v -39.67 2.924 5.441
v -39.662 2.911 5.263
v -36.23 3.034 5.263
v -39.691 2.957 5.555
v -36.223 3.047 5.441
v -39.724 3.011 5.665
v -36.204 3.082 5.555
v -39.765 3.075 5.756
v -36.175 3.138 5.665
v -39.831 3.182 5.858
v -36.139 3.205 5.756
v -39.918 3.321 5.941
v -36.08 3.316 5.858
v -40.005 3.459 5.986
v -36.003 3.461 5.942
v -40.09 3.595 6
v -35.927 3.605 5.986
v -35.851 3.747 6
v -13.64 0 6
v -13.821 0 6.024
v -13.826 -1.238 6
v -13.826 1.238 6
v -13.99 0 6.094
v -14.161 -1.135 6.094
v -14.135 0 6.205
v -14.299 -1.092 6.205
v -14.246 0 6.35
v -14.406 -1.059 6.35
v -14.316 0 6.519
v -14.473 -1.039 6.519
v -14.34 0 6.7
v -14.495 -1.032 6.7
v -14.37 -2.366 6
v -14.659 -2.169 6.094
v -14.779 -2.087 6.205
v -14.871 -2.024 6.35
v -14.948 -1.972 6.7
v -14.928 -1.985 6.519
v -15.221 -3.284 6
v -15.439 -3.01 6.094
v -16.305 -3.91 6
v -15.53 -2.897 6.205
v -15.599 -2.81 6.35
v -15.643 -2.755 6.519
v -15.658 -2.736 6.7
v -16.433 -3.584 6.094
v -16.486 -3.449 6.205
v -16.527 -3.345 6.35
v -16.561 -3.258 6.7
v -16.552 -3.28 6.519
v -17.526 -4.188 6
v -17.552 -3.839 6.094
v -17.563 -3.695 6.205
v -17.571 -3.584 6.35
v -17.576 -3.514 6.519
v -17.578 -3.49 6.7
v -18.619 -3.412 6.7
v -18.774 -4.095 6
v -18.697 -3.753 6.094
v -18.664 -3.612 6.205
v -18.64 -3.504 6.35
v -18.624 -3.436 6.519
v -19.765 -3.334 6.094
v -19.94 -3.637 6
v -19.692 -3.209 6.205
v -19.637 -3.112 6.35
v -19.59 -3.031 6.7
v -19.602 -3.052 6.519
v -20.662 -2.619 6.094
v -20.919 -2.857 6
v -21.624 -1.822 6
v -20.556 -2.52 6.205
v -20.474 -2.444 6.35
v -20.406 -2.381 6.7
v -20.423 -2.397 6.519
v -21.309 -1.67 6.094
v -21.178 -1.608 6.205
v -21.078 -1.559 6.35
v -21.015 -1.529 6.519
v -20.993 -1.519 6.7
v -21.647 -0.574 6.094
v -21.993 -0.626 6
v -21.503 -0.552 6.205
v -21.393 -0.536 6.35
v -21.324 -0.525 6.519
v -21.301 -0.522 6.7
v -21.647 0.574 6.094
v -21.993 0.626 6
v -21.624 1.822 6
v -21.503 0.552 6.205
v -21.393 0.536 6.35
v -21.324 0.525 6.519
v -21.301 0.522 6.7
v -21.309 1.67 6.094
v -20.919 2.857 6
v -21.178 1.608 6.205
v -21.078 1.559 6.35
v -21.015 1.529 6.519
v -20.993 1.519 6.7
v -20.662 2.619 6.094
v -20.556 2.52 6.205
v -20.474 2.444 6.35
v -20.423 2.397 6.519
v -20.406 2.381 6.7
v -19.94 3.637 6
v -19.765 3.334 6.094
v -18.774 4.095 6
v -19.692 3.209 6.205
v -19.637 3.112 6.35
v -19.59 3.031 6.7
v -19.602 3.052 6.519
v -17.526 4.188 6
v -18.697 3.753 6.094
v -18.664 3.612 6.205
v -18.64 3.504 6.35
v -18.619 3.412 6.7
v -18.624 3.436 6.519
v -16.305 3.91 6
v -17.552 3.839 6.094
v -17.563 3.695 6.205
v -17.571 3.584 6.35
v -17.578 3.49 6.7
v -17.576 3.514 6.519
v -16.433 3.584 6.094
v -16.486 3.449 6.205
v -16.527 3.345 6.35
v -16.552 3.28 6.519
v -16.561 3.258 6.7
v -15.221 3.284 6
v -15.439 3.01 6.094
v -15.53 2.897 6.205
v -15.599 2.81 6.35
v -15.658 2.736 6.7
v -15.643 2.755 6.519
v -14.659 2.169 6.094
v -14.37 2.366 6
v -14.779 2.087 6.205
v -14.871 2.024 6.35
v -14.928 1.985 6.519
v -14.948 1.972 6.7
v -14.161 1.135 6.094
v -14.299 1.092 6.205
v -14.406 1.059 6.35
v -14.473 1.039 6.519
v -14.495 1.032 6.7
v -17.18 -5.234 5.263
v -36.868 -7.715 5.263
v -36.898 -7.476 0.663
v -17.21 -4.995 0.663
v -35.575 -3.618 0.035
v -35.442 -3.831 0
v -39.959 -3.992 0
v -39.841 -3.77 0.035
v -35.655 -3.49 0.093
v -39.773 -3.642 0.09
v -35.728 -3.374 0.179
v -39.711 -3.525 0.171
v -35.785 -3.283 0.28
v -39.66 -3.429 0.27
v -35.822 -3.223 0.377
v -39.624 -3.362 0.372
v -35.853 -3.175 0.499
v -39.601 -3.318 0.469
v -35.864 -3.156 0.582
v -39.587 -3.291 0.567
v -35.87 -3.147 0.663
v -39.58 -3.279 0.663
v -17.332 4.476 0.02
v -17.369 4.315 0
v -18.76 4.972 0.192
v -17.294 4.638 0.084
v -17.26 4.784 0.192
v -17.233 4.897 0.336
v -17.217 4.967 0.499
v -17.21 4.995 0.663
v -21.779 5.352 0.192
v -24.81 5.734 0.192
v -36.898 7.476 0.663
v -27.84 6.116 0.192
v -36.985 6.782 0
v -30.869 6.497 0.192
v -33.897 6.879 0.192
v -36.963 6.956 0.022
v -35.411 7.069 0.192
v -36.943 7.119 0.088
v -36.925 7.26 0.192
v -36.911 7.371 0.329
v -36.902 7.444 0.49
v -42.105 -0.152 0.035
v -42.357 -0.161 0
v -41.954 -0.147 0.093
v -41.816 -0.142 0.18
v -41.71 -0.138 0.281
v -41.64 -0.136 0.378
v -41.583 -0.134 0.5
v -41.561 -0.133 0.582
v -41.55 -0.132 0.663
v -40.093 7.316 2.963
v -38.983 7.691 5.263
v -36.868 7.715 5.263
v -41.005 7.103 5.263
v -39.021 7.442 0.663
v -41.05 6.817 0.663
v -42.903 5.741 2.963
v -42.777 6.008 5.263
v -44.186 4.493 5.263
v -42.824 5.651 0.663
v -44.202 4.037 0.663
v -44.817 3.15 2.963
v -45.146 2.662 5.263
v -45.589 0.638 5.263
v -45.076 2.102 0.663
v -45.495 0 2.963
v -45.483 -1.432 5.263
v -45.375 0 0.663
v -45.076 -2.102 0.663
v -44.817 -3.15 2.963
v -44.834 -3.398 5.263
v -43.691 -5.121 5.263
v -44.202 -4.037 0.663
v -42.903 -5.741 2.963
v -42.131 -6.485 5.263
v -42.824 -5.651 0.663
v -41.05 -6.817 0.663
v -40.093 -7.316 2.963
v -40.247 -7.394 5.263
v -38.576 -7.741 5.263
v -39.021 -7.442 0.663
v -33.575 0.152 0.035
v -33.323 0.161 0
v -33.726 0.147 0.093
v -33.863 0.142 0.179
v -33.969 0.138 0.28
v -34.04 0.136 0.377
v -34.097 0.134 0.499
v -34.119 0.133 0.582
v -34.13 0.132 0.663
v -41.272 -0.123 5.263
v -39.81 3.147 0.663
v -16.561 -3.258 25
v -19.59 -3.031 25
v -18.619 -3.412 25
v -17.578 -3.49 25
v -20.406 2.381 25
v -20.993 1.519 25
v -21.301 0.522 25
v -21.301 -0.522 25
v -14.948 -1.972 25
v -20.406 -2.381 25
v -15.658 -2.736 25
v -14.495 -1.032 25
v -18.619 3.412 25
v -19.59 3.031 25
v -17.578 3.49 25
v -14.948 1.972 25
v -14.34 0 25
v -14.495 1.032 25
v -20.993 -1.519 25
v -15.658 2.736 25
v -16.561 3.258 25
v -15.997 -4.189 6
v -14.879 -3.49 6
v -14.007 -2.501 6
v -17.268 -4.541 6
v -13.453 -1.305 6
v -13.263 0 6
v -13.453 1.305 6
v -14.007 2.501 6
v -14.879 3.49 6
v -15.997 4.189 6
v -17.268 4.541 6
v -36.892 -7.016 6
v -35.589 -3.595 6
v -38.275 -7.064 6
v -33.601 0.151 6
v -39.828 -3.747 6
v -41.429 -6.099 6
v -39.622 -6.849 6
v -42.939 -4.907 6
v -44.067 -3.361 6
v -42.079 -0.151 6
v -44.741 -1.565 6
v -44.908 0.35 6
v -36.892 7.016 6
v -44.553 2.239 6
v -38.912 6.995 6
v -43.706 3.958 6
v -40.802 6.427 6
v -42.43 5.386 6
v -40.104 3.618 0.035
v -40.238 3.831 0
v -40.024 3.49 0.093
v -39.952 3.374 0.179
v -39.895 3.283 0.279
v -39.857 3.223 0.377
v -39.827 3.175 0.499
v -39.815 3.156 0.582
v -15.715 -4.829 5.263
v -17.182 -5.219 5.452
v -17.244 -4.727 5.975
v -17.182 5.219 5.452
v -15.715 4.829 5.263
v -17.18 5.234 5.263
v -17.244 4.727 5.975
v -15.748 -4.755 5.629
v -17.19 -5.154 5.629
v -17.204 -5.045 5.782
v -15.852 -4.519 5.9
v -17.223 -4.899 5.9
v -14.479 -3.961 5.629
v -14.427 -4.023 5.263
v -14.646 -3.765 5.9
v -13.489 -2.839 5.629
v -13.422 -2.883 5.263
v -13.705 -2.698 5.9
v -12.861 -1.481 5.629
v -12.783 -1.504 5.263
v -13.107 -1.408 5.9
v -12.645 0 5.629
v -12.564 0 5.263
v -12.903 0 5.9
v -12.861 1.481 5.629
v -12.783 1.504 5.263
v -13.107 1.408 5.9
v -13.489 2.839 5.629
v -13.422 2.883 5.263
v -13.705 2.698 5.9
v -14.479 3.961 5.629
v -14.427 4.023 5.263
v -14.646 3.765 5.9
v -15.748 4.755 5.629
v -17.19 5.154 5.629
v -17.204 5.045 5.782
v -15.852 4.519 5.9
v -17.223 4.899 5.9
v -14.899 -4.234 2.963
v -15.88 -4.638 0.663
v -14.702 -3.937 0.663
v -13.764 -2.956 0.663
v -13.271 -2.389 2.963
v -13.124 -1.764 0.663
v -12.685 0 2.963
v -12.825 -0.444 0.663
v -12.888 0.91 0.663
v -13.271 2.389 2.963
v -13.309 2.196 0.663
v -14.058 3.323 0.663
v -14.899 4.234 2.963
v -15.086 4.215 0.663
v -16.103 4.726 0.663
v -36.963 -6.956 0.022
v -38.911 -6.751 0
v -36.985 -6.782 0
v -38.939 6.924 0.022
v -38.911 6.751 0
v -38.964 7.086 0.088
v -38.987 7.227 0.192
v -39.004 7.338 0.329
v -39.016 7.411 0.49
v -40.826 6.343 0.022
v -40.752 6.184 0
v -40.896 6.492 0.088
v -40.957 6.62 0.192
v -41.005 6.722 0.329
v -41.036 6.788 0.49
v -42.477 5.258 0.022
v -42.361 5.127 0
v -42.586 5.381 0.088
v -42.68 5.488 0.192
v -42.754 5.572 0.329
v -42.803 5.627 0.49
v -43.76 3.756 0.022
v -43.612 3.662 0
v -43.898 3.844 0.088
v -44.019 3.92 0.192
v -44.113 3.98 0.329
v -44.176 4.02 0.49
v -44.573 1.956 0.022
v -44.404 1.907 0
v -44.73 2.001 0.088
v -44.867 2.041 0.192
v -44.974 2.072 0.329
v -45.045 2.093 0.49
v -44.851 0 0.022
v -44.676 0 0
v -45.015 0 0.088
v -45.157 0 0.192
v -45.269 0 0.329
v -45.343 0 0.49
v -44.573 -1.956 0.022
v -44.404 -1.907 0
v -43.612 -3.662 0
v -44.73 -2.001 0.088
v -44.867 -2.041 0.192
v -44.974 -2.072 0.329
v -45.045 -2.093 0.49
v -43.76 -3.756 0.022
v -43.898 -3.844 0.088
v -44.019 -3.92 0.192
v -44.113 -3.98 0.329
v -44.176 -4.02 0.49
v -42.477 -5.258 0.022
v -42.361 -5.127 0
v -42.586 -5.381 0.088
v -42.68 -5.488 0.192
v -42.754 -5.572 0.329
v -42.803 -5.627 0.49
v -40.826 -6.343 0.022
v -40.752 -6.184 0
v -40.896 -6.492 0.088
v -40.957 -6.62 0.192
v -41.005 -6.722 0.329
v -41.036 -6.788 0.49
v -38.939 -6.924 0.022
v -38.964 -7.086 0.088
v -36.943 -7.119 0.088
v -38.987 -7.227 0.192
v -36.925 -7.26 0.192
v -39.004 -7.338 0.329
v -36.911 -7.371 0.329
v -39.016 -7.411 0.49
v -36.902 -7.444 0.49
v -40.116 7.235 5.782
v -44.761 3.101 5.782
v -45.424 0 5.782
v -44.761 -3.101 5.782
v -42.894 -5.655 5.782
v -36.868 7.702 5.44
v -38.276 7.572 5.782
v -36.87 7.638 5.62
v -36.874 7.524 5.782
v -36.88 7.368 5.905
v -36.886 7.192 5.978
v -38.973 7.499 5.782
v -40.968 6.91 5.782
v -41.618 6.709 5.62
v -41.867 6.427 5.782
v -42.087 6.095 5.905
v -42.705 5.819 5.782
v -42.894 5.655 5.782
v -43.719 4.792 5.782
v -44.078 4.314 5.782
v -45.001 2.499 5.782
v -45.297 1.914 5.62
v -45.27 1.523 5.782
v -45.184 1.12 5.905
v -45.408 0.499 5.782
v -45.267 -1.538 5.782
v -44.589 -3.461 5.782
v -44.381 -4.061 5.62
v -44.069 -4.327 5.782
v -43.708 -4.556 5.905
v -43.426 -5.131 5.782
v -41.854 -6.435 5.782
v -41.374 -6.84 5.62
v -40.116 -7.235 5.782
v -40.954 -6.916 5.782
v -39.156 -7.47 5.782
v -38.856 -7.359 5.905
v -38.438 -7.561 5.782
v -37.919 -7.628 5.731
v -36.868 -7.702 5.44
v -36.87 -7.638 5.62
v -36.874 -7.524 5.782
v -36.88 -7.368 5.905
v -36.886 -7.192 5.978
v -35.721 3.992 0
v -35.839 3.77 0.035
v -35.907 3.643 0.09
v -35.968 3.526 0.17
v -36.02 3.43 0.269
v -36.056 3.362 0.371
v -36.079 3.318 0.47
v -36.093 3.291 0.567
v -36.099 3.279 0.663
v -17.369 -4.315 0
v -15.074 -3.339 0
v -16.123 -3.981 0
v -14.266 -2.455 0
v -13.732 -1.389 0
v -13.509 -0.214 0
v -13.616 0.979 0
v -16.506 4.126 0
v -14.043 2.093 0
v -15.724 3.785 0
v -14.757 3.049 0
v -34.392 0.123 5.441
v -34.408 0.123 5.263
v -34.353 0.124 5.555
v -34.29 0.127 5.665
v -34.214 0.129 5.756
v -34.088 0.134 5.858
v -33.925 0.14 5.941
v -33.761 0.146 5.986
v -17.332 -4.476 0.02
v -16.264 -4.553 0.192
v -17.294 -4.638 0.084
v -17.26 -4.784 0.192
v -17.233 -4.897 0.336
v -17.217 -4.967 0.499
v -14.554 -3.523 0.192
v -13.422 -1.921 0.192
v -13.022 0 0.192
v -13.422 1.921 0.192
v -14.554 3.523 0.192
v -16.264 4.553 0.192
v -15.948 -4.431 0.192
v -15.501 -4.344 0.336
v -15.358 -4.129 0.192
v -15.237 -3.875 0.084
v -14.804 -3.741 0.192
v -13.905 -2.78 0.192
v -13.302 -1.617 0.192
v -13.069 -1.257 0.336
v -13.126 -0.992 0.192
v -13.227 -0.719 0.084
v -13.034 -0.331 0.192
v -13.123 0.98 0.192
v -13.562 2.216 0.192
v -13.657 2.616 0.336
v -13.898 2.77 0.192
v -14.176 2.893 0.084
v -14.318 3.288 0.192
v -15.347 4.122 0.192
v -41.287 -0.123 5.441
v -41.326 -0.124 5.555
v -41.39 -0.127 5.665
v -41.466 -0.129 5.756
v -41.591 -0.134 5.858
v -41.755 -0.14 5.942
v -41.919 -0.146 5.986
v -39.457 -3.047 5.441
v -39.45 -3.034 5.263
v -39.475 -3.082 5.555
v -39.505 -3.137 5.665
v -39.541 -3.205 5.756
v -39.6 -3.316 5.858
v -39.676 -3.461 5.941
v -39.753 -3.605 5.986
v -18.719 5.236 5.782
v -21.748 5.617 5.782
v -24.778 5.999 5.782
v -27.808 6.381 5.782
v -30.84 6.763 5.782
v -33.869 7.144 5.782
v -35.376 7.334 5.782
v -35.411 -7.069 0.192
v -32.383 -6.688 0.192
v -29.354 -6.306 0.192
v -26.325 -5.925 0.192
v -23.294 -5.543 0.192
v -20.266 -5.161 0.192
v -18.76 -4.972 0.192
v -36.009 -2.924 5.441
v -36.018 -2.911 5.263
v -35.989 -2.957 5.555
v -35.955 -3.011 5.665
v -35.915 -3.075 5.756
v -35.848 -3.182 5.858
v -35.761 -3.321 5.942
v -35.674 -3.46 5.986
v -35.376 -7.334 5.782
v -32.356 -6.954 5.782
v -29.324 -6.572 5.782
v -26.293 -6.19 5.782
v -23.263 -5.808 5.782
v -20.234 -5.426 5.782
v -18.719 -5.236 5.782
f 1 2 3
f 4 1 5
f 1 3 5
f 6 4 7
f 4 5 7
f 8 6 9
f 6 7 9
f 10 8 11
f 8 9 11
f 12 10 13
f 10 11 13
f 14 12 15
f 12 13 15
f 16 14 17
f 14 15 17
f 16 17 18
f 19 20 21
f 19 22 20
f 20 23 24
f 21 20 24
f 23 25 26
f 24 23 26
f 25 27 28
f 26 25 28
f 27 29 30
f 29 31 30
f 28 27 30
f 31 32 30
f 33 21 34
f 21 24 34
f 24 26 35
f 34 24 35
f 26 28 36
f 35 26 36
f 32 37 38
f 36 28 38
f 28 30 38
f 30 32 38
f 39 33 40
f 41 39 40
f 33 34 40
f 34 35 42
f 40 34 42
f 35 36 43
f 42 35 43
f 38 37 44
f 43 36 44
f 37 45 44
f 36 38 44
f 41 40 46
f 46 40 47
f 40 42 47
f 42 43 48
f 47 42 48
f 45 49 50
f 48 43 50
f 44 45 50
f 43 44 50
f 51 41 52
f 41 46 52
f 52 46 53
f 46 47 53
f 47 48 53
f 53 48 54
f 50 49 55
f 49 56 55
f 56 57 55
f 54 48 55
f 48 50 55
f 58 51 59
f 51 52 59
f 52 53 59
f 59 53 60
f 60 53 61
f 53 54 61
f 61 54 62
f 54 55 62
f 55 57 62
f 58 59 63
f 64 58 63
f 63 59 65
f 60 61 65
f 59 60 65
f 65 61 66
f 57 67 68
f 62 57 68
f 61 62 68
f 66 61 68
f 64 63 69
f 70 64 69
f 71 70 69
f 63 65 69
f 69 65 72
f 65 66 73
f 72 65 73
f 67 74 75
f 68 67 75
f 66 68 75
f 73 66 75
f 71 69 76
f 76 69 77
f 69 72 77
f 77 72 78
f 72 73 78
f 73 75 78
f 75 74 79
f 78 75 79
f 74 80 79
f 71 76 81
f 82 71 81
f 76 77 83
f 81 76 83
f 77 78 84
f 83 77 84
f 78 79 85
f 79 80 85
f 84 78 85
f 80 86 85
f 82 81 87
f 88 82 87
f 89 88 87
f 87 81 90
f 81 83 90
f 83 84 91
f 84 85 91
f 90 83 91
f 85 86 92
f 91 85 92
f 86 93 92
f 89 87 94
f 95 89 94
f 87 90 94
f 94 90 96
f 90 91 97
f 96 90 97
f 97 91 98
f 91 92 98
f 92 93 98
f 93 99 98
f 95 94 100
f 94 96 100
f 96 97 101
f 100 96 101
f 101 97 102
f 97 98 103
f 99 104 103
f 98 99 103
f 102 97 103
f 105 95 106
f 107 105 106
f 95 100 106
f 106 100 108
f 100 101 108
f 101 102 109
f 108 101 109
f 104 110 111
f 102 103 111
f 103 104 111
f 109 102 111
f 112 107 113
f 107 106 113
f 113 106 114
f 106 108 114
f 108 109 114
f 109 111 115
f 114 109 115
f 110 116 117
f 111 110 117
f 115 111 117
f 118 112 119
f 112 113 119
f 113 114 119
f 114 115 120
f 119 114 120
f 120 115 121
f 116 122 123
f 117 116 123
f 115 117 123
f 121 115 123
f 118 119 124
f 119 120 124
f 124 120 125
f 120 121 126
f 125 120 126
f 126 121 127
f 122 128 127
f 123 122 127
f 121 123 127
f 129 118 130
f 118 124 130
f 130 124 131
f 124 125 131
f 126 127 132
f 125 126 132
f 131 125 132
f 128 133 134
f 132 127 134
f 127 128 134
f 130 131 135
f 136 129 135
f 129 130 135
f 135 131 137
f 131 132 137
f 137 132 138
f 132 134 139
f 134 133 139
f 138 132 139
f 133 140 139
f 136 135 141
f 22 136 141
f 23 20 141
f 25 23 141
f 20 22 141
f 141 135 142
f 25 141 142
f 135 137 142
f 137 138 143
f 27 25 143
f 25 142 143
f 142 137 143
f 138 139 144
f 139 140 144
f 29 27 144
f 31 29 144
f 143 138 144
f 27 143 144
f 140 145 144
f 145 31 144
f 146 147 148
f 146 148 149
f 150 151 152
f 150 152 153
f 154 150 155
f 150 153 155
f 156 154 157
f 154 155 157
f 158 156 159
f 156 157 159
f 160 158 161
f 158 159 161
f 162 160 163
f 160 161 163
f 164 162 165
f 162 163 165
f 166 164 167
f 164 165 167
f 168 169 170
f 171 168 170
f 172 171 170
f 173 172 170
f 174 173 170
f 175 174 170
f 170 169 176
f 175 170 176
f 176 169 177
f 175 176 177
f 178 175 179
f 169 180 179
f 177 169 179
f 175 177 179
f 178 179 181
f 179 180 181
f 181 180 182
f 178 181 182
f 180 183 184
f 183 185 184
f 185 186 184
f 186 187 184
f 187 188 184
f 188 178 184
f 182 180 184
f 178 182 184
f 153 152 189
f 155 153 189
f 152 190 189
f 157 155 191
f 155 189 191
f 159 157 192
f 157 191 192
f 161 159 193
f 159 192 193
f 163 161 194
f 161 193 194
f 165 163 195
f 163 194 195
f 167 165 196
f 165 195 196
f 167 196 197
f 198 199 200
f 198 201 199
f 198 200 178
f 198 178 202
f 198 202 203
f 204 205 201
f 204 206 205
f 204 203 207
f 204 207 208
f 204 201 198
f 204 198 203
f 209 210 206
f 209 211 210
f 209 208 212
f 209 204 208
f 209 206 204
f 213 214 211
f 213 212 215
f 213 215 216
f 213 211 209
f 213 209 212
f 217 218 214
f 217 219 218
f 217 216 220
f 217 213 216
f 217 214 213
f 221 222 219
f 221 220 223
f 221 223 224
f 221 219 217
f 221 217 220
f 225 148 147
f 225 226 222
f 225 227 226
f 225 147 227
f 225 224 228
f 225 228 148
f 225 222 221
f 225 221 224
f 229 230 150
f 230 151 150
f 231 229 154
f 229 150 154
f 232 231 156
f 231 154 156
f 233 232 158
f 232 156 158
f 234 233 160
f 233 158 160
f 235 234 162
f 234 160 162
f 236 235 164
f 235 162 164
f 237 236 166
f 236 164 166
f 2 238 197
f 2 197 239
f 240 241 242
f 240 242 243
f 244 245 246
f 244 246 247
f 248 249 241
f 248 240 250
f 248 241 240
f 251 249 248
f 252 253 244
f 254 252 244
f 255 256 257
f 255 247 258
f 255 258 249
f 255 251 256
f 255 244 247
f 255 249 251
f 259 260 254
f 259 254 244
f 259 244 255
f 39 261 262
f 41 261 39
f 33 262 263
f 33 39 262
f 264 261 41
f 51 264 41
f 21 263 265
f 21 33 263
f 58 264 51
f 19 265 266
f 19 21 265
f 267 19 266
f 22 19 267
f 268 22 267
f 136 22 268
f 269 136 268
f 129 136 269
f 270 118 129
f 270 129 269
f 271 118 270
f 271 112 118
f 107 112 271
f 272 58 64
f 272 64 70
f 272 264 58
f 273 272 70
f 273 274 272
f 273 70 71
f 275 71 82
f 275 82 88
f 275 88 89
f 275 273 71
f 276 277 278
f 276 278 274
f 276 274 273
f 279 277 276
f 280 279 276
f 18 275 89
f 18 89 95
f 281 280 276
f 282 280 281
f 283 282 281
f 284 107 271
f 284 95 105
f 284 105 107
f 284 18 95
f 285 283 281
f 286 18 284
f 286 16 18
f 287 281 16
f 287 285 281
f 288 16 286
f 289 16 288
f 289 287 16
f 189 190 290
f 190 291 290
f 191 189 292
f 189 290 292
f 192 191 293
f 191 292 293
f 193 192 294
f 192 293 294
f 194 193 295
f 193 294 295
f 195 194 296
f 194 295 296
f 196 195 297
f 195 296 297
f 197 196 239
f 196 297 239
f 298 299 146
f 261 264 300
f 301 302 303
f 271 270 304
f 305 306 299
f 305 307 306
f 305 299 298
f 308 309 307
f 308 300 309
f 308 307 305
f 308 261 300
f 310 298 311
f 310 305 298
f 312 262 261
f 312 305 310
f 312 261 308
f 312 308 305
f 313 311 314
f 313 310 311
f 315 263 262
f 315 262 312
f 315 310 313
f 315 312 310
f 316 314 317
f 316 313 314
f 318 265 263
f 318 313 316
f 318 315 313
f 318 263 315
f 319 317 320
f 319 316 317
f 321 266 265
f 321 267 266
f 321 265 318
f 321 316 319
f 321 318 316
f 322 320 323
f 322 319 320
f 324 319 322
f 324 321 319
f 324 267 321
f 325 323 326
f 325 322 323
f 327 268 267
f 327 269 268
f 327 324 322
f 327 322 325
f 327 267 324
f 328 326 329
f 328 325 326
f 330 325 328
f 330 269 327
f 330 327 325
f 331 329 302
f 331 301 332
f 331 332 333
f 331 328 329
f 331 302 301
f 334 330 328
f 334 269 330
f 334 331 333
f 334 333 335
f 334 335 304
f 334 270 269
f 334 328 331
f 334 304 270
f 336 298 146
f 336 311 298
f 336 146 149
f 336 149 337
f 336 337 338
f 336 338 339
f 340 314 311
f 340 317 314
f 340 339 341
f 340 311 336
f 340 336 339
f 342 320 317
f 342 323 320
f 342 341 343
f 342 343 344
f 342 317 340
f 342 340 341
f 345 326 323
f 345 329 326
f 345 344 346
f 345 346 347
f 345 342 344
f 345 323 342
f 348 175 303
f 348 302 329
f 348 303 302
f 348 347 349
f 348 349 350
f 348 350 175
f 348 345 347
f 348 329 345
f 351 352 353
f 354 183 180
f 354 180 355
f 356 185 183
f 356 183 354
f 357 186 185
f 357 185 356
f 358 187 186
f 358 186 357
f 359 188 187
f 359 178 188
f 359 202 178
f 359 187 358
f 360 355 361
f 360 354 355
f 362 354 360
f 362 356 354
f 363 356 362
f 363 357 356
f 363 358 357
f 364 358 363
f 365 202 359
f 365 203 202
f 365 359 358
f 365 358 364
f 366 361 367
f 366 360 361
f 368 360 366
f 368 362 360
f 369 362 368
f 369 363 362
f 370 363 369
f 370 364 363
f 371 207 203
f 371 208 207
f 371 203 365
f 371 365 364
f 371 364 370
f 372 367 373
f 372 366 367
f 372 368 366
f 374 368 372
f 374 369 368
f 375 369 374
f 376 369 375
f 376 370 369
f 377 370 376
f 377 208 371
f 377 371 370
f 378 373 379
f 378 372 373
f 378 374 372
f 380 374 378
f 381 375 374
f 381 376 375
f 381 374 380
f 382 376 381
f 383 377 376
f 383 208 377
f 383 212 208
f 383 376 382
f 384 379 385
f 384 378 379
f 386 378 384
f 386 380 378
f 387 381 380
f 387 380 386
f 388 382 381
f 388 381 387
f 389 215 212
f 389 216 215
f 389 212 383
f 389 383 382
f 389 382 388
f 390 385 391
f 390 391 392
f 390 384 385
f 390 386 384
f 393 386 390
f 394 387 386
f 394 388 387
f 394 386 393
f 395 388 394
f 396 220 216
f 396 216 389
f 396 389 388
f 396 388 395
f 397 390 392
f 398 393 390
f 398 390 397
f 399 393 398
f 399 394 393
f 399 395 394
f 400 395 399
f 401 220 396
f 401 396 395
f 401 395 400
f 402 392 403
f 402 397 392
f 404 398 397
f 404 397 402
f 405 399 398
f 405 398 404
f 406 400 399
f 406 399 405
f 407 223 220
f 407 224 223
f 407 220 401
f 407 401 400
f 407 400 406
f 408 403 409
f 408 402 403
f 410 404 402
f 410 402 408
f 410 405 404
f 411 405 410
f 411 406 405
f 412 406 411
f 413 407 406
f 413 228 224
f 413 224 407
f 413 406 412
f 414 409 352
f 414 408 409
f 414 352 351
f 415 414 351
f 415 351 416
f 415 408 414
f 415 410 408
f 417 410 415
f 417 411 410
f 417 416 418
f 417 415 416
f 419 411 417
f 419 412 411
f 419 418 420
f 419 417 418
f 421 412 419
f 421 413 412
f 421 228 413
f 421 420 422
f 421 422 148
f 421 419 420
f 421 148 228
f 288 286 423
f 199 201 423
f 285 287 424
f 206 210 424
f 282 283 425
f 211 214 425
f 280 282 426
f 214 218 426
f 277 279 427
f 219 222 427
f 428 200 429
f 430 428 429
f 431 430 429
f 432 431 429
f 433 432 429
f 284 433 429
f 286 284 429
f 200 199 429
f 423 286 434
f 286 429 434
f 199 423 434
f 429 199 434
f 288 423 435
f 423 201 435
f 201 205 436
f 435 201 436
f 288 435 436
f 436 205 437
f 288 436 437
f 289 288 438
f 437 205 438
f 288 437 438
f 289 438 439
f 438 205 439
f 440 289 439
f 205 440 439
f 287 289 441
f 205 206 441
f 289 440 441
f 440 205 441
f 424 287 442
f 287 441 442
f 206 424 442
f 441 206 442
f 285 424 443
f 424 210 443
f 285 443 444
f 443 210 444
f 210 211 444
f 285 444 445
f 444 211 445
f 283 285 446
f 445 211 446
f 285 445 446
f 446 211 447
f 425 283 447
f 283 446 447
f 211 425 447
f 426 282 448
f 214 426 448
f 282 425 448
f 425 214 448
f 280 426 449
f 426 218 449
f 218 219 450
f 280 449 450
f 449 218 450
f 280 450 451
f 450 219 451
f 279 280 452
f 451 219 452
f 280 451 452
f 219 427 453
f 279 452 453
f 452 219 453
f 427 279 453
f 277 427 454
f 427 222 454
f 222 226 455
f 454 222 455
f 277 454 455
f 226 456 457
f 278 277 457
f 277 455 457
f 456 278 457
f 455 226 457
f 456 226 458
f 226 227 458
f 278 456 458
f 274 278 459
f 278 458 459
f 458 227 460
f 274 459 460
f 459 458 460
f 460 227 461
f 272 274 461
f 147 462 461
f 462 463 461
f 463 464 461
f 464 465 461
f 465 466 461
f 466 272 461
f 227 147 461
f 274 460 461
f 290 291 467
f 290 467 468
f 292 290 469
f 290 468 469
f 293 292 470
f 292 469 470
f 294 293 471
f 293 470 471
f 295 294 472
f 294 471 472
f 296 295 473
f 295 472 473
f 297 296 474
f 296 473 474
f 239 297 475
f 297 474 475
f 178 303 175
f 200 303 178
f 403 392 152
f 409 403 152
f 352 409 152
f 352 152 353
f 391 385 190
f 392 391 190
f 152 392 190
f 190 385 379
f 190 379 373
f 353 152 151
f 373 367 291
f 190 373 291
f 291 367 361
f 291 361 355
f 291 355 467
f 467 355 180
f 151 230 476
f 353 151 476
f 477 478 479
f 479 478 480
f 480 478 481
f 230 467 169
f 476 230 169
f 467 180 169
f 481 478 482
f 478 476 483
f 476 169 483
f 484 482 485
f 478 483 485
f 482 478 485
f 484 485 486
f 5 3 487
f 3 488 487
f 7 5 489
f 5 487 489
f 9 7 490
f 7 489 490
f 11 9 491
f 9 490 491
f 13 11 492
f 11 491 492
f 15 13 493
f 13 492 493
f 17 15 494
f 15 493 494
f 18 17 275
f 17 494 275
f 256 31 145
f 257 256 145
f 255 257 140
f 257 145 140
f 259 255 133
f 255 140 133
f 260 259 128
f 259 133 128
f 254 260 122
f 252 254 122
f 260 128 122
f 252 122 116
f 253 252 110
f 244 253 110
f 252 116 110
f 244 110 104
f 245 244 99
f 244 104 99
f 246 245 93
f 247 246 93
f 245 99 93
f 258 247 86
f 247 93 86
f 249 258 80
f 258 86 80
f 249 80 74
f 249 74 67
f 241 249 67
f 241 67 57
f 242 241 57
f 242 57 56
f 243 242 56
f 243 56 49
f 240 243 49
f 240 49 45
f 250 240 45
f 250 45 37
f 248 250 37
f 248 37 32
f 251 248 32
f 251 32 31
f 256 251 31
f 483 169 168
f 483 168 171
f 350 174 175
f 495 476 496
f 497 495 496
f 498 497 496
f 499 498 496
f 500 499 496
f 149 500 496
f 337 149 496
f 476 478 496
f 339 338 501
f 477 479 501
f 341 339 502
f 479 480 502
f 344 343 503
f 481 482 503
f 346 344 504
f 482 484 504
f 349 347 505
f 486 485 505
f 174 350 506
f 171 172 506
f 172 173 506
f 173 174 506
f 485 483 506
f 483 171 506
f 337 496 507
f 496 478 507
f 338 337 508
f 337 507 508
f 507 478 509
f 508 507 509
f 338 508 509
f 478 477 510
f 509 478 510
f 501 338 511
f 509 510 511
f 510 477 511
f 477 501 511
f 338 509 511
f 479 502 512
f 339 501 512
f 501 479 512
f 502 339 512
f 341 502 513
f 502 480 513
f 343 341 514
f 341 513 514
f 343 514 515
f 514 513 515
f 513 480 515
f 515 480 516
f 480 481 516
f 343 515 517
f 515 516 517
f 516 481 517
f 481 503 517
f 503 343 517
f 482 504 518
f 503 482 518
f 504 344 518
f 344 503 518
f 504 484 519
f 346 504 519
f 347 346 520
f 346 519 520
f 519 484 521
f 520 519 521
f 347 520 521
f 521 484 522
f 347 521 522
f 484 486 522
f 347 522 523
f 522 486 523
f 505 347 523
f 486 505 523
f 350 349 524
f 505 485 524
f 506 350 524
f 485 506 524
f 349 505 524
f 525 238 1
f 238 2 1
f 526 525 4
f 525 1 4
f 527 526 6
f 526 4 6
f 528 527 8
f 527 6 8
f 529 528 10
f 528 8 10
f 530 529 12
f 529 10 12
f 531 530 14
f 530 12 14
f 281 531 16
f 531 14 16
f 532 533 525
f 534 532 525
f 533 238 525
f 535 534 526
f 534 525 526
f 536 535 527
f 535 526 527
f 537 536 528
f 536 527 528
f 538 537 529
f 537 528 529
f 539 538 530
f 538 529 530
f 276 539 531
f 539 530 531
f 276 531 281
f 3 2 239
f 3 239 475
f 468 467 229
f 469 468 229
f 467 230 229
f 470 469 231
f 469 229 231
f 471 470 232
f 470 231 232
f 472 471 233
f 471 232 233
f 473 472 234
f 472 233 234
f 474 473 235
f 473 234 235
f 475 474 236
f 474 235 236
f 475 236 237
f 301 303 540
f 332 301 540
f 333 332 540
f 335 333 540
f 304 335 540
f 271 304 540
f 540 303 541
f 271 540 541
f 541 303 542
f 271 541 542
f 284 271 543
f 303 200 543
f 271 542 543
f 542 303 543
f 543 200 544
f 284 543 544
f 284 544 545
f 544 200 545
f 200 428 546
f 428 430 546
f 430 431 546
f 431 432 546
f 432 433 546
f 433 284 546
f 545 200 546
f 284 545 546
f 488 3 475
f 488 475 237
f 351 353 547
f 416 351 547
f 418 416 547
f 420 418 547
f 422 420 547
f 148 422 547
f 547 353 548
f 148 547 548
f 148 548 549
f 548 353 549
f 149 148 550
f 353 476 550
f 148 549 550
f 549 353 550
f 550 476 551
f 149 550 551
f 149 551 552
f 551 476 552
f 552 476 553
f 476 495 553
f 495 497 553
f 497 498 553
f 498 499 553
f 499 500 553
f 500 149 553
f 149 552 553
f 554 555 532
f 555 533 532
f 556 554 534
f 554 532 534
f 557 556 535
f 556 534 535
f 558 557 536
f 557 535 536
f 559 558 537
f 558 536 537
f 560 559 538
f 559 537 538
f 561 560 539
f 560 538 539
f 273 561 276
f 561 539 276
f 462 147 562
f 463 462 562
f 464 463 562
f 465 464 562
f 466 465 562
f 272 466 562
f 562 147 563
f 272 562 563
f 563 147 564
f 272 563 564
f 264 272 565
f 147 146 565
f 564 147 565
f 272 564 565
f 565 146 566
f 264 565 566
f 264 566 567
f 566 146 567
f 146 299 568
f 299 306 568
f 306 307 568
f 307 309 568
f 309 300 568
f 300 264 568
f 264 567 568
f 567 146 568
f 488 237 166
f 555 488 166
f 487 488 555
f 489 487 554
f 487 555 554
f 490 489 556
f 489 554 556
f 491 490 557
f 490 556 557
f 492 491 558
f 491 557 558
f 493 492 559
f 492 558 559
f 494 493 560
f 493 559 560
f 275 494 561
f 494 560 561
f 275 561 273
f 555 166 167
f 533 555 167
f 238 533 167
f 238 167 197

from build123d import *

# Parameters (mm, degrees)
F0_R     = 3.5
F1_DEPTH = 6
F1_TAPER = -3
F2_DEPTH = 25
F3_R     = 0.7


with BuildPart() as f1:
    # F0 (on Top) → F1 (new body)
    with BuildSketch(Plane.XY):
        with BuildLine():
            Line((-17.214833647, 4.9607837082), (-36.902333647, 7.4411755624))
            ThreePointArc((-36.902333647, 7.4411755624), (-45.339833647, 0), (-36.902333647, -7.4411755624))
            Line((-36.902333647, -7.4411755624), (-17.214833647, -4.9607837082))
            ThreePointArc((-17.214833647, -4.9607837082), (-12.839833647, 0), (-17.214833647, 4.9607837082))
        make_face()
        Polygon((-36.080574115, 3.3148663974), (-34.0894453707, 0.1338697521), (-35.8487049027, -3.1809966452), (-39.599093179, -3.3148663974), (-41.5902219233, -0.1338697521), (-39.8309623913, 3.1809966452), align=None, mode=Mode.SUBTRACT)
        with Locations((-17.839833647, 0)):
            Circle(F0_R, mode=Mode.SUBTRACT)
    extrude(amount=F1_DEPTH, taper=F1_TAPER)

    # F0 (on Top) → F2 (join)
    with BuildSketch(Plane.XY):
        with Locations((-17.839833647, 0)):
            Circle(F0_R)
    extrude(amount=F2_DEPTH)

    # F3
    f3_edges = [f1.edges().sort_by_distance(p)[0] for p in [
        (-27.058584, 6.20098, 0),
        (-45.339834, 0, 0),
        (-27.058584, -6.20098, 0),
        (-12.839834, 0, 0),
        (-40.594658, -1.724368, 0),
        (-40.710592, 1.523563, 0),
        (-37.955768, 3.247932, 0),
        (-35.08501, 1.724368, 0),
        (-34.969075, -1.523563, 0),
        (-37.723899, -3.247932, 0),
        (-27.019278, 6.51296, 6),
        (-45.65428, 0, 6),
        (-27.019278, -6.51296, 6),
        (-12.525387, 0, 6),
        (-21.339834, 0, 6),
        (-40.328121, -1.557531, 6),
        (-37.735116, -2.933685, 6),
        (-40.432838, 1.376154, 6),
        (-35.246829, -1.376154, 6),
        (-37.944551, 2.933685, 6),
        (-35.351547, 1.557531, 6),
    ]]
    fillet(f3_edges, radius=F3_R)


solid = f1.part
